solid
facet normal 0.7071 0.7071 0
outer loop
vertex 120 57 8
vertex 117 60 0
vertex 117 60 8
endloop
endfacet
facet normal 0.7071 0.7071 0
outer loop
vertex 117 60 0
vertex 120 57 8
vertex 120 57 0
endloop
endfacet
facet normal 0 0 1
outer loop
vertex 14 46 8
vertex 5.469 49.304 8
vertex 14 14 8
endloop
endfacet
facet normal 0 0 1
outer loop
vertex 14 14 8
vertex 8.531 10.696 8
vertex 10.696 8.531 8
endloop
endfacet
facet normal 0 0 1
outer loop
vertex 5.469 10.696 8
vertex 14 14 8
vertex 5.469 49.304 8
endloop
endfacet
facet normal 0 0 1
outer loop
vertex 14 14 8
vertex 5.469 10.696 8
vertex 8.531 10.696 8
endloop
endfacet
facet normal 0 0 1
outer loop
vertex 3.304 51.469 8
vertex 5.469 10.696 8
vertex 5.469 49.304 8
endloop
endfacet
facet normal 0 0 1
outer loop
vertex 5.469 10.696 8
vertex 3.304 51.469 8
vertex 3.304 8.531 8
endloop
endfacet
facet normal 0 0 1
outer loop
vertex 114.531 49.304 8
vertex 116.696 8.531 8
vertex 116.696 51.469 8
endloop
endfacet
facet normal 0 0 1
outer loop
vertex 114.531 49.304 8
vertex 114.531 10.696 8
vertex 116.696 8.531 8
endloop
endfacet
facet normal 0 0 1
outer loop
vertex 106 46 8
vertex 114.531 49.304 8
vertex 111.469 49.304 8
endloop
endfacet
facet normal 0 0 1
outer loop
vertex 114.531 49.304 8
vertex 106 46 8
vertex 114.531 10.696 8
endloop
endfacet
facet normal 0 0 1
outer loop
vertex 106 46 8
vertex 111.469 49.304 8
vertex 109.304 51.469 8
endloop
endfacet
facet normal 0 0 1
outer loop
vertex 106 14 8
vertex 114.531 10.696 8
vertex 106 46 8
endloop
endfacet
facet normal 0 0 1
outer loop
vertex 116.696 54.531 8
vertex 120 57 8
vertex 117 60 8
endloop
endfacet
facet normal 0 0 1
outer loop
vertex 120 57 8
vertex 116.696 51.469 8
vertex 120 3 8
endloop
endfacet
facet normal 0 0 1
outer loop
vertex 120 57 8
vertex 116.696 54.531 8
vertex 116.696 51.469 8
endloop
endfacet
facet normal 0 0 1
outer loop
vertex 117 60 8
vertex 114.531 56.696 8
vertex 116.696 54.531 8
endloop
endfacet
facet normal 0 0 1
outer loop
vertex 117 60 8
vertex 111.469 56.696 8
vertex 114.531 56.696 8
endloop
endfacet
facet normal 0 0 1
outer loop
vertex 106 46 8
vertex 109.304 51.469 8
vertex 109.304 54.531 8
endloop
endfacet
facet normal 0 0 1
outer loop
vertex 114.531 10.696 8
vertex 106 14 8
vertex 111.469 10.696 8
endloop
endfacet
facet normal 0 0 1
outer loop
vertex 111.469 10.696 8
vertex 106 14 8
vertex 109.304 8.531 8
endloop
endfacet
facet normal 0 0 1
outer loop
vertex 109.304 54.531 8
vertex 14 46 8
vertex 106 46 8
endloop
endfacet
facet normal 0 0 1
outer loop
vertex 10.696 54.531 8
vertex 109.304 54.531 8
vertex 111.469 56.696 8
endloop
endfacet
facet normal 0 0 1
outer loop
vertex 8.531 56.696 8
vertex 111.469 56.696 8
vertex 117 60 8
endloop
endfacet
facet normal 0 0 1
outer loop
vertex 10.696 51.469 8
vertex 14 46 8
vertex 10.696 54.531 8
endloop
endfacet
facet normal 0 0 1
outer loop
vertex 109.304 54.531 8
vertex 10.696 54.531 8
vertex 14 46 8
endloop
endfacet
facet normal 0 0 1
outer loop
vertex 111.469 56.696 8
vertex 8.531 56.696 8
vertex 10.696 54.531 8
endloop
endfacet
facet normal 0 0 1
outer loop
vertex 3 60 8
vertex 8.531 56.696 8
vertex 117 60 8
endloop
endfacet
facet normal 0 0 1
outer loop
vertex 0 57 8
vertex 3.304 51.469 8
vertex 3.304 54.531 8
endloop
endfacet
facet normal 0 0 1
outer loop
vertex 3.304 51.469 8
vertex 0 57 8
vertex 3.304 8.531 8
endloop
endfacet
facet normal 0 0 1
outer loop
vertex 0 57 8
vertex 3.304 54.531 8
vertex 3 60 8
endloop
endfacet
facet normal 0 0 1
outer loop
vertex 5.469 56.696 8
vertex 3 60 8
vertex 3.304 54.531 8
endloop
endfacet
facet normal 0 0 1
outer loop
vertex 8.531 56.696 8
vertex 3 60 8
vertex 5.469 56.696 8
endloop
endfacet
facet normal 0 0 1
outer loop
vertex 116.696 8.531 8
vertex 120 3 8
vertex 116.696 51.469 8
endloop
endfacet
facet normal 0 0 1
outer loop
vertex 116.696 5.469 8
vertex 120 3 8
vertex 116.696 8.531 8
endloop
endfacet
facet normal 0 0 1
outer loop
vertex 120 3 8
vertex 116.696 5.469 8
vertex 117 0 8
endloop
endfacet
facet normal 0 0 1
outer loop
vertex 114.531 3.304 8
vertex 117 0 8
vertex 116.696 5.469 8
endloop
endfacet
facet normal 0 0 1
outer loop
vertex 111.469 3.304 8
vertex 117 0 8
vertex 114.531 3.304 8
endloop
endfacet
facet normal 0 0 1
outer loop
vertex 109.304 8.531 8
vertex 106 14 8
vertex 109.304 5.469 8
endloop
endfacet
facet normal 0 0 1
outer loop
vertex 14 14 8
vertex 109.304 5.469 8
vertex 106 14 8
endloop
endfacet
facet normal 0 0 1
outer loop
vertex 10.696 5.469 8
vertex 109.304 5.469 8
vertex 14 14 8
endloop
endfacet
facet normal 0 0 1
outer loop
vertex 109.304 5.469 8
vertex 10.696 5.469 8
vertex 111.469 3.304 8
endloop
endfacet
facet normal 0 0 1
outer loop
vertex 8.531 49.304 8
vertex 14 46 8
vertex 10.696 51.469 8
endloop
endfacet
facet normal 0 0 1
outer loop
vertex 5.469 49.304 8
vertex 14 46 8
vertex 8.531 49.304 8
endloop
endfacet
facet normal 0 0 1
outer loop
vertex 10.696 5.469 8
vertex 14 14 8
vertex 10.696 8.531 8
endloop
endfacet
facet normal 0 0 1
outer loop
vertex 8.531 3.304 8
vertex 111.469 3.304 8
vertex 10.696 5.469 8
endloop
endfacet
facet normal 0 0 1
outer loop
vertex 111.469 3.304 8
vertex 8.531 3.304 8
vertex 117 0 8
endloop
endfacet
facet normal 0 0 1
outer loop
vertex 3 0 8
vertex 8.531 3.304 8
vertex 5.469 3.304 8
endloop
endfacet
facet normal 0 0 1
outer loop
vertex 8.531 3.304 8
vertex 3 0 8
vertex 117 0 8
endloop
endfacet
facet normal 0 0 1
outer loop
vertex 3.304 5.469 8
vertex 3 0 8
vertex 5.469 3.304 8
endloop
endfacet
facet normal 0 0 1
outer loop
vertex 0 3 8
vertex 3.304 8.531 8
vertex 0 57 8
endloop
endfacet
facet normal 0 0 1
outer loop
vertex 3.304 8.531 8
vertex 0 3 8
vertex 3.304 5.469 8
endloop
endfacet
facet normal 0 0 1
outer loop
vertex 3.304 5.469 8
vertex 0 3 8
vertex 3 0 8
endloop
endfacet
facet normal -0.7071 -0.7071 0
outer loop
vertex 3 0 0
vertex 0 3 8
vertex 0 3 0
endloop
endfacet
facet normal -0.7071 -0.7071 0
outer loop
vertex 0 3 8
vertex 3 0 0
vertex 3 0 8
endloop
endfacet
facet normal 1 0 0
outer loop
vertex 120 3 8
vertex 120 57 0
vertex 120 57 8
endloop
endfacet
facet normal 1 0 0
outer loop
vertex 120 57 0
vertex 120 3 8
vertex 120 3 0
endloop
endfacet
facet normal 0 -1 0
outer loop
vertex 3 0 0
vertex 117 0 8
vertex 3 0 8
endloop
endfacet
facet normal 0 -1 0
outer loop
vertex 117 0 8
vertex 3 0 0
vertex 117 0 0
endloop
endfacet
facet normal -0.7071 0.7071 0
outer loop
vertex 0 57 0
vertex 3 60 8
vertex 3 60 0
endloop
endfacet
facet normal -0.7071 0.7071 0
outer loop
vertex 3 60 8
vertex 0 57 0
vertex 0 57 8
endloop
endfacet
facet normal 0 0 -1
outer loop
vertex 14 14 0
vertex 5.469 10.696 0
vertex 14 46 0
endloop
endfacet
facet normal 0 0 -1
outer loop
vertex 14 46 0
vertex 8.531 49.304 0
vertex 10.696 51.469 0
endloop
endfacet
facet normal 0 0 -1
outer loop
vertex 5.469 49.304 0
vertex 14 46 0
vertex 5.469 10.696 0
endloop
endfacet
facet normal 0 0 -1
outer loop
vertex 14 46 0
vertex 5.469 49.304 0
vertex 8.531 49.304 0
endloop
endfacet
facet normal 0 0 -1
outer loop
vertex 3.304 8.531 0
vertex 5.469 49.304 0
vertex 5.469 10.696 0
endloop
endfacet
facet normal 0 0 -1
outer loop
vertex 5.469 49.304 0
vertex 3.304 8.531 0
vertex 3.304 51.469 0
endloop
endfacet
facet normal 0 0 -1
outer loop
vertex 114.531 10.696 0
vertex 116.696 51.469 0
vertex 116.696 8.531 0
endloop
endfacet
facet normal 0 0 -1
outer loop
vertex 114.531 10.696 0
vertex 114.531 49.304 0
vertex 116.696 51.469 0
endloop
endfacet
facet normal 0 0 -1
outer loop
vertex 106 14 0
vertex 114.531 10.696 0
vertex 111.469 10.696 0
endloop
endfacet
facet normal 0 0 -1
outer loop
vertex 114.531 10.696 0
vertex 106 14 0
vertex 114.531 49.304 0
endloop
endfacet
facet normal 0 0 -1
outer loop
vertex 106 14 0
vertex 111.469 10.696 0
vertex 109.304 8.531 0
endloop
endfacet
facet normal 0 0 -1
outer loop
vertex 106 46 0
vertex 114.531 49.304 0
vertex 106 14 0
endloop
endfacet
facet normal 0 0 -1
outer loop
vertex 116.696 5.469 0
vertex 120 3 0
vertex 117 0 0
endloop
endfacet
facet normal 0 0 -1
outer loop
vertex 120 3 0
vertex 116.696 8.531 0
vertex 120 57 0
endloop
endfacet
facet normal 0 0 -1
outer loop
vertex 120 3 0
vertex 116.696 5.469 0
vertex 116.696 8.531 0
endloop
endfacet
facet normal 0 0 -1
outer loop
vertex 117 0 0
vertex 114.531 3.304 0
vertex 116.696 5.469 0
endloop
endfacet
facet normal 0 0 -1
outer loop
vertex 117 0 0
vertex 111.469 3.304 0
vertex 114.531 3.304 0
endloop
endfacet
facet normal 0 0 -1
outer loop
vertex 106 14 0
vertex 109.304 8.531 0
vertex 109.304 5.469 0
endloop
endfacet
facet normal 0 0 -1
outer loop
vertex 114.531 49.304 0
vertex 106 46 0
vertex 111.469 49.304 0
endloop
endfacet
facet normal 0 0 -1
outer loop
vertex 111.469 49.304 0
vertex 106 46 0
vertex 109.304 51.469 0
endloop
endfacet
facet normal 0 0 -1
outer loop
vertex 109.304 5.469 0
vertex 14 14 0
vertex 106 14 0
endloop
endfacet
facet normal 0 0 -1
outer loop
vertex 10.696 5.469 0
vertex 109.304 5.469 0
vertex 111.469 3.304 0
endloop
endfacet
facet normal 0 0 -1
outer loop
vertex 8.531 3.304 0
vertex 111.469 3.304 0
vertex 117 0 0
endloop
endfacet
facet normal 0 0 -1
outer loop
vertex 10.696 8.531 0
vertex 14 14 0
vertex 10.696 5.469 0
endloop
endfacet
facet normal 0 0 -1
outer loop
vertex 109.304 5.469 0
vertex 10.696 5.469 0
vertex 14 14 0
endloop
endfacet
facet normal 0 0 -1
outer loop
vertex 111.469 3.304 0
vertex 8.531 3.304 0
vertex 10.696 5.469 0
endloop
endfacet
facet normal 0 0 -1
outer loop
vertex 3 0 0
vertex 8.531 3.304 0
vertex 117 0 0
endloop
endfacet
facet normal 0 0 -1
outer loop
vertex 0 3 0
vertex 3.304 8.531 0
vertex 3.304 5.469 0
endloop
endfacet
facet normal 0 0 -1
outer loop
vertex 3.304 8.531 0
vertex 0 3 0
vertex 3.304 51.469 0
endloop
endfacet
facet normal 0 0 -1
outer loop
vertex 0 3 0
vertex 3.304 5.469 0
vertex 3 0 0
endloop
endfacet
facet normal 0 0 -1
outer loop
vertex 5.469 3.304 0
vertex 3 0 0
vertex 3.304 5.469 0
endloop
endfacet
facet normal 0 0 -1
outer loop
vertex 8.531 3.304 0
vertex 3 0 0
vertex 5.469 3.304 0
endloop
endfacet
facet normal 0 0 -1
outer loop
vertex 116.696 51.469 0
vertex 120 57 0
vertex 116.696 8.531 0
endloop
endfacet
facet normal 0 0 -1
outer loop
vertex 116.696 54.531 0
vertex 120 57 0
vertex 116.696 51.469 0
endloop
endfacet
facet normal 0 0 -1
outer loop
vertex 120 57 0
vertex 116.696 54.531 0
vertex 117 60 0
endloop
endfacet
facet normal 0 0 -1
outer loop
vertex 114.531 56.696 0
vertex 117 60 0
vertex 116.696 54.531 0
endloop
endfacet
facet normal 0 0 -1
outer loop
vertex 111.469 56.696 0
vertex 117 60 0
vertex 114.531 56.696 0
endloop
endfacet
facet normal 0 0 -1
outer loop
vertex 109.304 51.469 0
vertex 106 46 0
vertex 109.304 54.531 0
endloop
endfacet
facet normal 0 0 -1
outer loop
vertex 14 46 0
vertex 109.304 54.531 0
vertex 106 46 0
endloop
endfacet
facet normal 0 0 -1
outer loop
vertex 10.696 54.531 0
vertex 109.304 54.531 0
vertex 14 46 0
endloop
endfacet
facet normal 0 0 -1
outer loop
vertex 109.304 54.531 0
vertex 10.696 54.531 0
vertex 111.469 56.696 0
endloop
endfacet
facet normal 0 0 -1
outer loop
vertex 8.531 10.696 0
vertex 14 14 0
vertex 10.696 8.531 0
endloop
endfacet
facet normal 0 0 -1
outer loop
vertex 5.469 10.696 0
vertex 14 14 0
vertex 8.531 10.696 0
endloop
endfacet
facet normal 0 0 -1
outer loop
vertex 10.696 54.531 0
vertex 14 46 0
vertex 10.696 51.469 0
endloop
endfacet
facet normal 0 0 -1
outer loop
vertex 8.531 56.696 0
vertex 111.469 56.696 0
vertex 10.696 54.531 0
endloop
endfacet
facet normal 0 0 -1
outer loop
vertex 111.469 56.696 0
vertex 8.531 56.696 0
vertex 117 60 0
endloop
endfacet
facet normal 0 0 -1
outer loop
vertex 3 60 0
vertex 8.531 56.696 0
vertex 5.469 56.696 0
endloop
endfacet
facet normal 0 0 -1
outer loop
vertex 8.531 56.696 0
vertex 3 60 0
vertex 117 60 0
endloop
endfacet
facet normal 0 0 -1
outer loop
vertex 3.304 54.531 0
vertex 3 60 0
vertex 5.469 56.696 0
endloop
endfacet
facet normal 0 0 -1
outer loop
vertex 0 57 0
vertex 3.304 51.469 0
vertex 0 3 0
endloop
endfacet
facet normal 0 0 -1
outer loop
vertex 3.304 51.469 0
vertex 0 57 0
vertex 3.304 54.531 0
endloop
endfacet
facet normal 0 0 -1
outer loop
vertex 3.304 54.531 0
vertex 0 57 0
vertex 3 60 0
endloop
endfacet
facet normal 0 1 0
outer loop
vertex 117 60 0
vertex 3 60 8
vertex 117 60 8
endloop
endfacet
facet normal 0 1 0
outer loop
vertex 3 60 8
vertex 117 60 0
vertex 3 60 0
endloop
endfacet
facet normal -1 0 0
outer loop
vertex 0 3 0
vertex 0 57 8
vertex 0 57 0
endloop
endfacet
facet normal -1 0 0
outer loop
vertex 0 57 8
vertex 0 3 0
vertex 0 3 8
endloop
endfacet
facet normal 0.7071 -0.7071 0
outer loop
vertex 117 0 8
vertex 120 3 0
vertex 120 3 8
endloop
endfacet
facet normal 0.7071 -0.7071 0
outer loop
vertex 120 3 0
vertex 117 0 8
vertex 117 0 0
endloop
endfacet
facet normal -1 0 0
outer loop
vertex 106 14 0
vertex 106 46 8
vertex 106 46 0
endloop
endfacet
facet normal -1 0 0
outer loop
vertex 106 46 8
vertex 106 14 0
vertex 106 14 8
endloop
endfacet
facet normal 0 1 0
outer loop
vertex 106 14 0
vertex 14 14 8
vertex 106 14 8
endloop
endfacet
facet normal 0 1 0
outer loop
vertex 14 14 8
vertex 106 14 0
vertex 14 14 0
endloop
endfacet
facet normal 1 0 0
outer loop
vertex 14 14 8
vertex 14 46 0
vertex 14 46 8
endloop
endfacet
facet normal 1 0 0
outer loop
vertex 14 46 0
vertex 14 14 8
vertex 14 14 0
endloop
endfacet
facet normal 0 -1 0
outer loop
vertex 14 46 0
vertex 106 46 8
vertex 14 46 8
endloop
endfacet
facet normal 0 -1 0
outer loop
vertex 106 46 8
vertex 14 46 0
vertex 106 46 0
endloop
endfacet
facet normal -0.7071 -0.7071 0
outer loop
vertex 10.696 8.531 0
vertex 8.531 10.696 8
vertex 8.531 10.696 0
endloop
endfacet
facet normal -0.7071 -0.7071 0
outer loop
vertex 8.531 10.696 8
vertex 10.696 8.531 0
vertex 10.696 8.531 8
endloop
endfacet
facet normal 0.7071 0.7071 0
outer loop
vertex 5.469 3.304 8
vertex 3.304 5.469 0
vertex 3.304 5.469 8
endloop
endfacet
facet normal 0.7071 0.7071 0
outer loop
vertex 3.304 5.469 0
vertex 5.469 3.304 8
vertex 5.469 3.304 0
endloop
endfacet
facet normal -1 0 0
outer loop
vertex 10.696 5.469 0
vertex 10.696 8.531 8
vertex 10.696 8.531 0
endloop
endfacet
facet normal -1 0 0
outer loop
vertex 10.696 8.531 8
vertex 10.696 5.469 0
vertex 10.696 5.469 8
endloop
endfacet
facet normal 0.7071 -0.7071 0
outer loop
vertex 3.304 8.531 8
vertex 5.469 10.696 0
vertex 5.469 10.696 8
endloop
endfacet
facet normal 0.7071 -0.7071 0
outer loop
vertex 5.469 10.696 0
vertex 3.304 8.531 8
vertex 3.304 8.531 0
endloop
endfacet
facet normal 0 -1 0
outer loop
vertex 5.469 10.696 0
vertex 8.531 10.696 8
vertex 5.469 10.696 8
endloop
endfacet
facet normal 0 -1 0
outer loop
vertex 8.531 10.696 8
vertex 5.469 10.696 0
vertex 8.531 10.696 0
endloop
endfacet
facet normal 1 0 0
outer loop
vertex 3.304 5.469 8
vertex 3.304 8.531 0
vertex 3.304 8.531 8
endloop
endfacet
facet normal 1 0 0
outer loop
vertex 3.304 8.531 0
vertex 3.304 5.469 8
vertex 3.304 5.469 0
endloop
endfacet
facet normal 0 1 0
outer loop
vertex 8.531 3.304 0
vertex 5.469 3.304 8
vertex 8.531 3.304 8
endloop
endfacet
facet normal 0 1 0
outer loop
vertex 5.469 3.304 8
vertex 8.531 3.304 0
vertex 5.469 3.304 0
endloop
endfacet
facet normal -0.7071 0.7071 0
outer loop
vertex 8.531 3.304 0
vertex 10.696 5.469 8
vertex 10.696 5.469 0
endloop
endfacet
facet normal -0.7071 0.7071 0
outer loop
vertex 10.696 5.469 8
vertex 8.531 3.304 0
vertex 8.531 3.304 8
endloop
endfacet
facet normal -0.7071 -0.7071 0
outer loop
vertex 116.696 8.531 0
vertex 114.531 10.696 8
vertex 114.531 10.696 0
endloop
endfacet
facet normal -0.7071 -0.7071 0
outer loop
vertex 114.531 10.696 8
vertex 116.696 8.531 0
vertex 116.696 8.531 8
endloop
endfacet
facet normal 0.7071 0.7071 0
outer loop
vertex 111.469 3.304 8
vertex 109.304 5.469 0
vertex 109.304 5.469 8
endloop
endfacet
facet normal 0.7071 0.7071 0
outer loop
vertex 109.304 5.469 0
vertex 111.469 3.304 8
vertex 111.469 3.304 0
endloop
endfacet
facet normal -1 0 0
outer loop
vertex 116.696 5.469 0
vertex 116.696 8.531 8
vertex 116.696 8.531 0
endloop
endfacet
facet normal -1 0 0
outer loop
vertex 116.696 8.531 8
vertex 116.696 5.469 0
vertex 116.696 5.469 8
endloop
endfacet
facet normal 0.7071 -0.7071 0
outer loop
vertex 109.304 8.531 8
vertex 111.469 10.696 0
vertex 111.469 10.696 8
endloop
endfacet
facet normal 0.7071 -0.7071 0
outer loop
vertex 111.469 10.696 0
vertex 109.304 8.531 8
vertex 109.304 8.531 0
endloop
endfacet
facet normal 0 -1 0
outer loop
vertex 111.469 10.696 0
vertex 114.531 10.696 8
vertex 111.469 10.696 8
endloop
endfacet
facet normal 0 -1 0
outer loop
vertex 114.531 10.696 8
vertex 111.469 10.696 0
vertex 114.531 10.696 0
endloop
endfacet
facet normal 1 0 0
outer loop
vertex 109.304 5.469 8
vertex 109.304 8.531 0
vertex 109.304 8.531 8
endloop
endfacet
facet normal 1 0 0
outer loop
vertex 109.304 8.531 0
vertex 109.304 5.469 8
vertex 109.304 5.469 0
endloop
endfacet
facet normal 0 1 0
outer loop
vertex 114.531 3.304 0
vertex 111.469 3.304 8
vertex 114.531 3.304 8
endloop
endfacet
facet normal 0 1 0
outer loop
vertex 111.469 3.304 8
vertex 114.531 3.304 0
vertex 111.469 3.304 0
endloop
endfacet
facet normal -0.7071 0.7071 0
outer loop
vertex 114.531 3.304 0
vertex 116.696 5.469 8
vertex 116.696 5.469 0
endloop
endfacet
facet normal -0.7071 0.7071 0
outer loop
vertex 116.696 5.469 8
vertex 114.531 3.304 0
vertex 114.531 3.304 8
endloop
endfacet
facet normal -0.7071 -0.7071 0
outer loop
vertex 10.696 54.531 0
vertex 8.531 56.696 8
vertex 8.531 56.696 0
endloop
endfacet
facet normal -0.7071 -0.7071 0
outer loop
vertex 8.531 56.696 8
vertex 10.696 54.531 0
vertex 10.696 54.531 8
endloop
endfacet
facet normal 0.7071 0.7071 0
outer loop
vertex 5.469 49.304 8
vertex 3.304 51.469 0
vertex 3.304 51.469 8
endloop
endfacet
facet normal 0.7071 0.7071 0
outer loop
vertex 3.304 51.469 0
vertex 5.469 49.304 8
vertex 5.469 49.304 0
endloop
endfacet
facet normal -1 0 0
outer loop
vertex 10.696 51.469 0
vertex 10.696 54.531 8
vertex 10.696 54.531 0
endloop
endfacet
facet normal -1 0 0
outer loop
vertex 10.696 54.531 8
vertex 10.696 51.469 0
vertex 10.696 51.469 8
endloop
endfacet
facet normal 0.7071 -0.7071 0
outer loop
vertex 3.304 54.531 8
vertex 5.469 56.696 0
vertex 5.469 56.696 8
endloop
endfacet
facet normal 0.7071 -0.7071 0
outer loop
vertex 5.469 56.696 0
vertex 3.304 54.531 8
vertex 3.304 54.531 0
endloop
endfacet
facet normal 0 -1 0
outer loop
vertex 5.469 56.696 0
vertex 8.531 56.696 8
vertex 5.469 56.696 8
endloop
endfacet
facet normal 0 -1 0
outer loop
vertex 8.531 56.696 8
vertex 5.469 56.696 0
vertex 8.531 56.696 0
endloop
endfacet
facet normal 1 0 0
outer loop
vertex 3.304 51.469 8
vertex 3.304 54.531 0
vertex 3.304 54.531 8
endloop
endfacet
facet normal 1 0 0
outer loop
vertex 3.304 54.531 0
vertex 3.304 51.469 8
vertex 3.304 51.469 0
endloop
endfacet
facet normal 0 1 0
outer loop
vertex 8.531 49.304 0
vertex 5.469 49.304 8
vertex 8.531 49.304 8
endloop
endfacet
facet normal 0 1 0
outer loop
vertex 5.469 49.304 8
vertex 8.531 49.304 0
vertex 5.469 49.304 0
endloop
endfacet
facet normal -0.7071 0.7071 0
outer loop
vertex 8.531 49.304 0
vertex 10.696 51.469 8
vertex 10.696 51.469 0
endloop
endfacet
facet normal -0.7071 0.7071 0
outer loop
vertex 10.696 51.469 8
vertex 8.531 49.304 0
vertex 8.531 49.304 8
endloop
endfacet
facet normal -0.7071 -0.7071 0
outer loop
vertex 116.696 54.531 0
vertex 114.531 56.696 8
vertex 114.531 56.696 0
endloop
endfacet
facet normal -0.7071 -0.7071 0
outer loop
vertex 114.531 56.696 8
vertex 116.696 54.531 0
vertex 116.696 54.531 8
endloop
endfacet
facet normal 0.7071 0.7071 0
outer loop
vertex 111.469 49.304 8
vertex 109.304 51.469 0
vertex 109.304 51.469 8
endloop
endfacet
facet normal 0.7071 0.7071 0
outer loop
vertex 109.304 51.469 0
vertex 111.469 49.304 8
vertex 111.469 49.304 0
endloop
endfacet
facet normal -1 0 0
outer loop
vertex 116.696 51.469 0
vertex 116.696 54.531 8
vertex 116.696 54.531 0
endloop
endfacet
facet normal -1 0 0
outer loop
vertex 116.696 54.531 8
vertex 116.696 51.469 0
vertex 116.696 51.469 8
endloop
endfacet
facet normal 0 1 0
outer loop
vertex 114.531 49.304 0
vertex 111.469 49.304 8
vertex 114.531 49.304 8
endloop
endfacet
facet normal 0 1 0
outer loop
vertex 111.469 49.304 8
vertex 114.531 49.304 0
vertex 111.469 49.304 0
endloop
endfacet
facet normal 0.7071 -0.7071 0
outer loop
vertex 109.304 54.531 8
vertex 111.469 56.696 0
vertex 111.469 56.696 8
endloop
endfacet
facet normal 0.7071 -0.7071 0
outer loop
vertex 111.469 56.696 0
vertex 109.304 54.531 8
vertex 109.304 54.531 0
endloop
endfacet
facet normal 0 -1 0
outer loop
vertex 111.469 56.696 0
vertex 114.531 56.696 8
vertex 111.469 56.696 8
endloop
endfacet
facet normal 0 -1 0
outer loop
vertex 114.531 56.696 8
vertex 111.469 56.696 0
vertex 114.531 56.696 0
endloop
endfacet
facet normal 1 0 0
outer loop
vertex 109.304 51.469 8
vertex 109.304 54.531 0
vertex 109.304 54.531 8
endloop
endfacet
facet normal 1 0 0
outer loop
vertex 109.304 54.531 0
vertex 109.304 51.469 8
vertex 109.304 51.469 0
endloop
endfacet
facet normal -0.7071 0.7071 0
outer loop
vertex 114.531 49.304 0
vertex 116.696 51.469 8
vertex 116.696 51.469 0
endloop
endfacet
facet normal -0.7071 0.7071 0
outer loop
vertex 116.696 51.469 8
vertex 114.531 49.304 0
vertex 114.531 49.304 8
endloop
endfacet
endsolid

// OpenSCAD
$fn = 32;

// ----------------------------------------------------------------------
// Frame plate: 120 x 60 frame, 14 mm rails
// ----------------------------------------------------------------------

// --- parameters (mm) ---
plate_l = 120;            // plate length, X
plate_w = 60;             // plate width, Y
plate_t = 8;              // plate thickness, Z (extrusion height)
corner_c = 3;             // corner chamfer
frame_bar = 14;           // frame rail width
bolt_r = 4;               // corner bolt window radius
bolt_inset = 7;           // bolt centre inset from the edges

win_l = plate_l - 2 * frame_bar;  // window length
win_w = plate_w - 2 * frame_bar;  // window width
bolt_d = 2 * bolt_r;  // corner hole diameter

profile = [[3, 0], [117, 0], [120, 3], [120, 57], [117, 60], [3, 60], [0, 57], [0, 3]];  // primary outline, 8 points, counter clockwise
void_1 = [[14, 14], [106, 14], [106, 46], [14, 46]];  // the window, 4 points
void_2 = [[10.696, 8.531], [8.531, 10.696], [5.469, 10.696], [3.304, 8.531], [3.304, 5.469], [5.469, 3.304], [8.531, 3.304], [10.696, 5.469]];  // corner bolt window, 8 points
void_3 = [[116.696, 8.531], [114.531, 10.696], [111.469, 10.696], [109.304, 8.531], [109.304, 5.469], [111.469, 3.304], [114.531, 3.304], [116.696, 5.469]];  // corner bolt window, 8 points
void_4 = [[10.696, 54.531], [8.531, 56.696], [5.469, 56.696], [3.304, 54.531], [3.304, 51.469], [5.469, 49.304], [8.531, 49.304], [10.696, 51.469]];  // corner bolt window, 8 points
void_5 = [[116.696, 54.531], [114.531, 56.696], [111.469, 56.696], [109.304, 54.531], [109.304, 51.469], [111.469, 49.304], [114.531, 49.304], [116.696, 51.469]];  // corner bolt window, 8 points

// --- the one profile operation ---
difference() {
  linear_extrude(height = plate_t) polygon(points = profile);
  translate([0, 0, -1])
    linear_extrude(height = plate_t + 2) polygon(points = void_1);
  translate([0, 0, -1])
    linear_extrude(height = plate_t + 2) polygon(points = void_2);
  translate([0, 0, -1])
    linear_extrude(height = plate_t + 2) polygon(points = void_3);
  translate([0, 0, -1])
    linear_extrude(height = plate_t + 2) polygon(points = void_4);
  translate([0, 0, -1])
    linear_extrude(height = plate_t + 2) polygon(points = void_5);
}
